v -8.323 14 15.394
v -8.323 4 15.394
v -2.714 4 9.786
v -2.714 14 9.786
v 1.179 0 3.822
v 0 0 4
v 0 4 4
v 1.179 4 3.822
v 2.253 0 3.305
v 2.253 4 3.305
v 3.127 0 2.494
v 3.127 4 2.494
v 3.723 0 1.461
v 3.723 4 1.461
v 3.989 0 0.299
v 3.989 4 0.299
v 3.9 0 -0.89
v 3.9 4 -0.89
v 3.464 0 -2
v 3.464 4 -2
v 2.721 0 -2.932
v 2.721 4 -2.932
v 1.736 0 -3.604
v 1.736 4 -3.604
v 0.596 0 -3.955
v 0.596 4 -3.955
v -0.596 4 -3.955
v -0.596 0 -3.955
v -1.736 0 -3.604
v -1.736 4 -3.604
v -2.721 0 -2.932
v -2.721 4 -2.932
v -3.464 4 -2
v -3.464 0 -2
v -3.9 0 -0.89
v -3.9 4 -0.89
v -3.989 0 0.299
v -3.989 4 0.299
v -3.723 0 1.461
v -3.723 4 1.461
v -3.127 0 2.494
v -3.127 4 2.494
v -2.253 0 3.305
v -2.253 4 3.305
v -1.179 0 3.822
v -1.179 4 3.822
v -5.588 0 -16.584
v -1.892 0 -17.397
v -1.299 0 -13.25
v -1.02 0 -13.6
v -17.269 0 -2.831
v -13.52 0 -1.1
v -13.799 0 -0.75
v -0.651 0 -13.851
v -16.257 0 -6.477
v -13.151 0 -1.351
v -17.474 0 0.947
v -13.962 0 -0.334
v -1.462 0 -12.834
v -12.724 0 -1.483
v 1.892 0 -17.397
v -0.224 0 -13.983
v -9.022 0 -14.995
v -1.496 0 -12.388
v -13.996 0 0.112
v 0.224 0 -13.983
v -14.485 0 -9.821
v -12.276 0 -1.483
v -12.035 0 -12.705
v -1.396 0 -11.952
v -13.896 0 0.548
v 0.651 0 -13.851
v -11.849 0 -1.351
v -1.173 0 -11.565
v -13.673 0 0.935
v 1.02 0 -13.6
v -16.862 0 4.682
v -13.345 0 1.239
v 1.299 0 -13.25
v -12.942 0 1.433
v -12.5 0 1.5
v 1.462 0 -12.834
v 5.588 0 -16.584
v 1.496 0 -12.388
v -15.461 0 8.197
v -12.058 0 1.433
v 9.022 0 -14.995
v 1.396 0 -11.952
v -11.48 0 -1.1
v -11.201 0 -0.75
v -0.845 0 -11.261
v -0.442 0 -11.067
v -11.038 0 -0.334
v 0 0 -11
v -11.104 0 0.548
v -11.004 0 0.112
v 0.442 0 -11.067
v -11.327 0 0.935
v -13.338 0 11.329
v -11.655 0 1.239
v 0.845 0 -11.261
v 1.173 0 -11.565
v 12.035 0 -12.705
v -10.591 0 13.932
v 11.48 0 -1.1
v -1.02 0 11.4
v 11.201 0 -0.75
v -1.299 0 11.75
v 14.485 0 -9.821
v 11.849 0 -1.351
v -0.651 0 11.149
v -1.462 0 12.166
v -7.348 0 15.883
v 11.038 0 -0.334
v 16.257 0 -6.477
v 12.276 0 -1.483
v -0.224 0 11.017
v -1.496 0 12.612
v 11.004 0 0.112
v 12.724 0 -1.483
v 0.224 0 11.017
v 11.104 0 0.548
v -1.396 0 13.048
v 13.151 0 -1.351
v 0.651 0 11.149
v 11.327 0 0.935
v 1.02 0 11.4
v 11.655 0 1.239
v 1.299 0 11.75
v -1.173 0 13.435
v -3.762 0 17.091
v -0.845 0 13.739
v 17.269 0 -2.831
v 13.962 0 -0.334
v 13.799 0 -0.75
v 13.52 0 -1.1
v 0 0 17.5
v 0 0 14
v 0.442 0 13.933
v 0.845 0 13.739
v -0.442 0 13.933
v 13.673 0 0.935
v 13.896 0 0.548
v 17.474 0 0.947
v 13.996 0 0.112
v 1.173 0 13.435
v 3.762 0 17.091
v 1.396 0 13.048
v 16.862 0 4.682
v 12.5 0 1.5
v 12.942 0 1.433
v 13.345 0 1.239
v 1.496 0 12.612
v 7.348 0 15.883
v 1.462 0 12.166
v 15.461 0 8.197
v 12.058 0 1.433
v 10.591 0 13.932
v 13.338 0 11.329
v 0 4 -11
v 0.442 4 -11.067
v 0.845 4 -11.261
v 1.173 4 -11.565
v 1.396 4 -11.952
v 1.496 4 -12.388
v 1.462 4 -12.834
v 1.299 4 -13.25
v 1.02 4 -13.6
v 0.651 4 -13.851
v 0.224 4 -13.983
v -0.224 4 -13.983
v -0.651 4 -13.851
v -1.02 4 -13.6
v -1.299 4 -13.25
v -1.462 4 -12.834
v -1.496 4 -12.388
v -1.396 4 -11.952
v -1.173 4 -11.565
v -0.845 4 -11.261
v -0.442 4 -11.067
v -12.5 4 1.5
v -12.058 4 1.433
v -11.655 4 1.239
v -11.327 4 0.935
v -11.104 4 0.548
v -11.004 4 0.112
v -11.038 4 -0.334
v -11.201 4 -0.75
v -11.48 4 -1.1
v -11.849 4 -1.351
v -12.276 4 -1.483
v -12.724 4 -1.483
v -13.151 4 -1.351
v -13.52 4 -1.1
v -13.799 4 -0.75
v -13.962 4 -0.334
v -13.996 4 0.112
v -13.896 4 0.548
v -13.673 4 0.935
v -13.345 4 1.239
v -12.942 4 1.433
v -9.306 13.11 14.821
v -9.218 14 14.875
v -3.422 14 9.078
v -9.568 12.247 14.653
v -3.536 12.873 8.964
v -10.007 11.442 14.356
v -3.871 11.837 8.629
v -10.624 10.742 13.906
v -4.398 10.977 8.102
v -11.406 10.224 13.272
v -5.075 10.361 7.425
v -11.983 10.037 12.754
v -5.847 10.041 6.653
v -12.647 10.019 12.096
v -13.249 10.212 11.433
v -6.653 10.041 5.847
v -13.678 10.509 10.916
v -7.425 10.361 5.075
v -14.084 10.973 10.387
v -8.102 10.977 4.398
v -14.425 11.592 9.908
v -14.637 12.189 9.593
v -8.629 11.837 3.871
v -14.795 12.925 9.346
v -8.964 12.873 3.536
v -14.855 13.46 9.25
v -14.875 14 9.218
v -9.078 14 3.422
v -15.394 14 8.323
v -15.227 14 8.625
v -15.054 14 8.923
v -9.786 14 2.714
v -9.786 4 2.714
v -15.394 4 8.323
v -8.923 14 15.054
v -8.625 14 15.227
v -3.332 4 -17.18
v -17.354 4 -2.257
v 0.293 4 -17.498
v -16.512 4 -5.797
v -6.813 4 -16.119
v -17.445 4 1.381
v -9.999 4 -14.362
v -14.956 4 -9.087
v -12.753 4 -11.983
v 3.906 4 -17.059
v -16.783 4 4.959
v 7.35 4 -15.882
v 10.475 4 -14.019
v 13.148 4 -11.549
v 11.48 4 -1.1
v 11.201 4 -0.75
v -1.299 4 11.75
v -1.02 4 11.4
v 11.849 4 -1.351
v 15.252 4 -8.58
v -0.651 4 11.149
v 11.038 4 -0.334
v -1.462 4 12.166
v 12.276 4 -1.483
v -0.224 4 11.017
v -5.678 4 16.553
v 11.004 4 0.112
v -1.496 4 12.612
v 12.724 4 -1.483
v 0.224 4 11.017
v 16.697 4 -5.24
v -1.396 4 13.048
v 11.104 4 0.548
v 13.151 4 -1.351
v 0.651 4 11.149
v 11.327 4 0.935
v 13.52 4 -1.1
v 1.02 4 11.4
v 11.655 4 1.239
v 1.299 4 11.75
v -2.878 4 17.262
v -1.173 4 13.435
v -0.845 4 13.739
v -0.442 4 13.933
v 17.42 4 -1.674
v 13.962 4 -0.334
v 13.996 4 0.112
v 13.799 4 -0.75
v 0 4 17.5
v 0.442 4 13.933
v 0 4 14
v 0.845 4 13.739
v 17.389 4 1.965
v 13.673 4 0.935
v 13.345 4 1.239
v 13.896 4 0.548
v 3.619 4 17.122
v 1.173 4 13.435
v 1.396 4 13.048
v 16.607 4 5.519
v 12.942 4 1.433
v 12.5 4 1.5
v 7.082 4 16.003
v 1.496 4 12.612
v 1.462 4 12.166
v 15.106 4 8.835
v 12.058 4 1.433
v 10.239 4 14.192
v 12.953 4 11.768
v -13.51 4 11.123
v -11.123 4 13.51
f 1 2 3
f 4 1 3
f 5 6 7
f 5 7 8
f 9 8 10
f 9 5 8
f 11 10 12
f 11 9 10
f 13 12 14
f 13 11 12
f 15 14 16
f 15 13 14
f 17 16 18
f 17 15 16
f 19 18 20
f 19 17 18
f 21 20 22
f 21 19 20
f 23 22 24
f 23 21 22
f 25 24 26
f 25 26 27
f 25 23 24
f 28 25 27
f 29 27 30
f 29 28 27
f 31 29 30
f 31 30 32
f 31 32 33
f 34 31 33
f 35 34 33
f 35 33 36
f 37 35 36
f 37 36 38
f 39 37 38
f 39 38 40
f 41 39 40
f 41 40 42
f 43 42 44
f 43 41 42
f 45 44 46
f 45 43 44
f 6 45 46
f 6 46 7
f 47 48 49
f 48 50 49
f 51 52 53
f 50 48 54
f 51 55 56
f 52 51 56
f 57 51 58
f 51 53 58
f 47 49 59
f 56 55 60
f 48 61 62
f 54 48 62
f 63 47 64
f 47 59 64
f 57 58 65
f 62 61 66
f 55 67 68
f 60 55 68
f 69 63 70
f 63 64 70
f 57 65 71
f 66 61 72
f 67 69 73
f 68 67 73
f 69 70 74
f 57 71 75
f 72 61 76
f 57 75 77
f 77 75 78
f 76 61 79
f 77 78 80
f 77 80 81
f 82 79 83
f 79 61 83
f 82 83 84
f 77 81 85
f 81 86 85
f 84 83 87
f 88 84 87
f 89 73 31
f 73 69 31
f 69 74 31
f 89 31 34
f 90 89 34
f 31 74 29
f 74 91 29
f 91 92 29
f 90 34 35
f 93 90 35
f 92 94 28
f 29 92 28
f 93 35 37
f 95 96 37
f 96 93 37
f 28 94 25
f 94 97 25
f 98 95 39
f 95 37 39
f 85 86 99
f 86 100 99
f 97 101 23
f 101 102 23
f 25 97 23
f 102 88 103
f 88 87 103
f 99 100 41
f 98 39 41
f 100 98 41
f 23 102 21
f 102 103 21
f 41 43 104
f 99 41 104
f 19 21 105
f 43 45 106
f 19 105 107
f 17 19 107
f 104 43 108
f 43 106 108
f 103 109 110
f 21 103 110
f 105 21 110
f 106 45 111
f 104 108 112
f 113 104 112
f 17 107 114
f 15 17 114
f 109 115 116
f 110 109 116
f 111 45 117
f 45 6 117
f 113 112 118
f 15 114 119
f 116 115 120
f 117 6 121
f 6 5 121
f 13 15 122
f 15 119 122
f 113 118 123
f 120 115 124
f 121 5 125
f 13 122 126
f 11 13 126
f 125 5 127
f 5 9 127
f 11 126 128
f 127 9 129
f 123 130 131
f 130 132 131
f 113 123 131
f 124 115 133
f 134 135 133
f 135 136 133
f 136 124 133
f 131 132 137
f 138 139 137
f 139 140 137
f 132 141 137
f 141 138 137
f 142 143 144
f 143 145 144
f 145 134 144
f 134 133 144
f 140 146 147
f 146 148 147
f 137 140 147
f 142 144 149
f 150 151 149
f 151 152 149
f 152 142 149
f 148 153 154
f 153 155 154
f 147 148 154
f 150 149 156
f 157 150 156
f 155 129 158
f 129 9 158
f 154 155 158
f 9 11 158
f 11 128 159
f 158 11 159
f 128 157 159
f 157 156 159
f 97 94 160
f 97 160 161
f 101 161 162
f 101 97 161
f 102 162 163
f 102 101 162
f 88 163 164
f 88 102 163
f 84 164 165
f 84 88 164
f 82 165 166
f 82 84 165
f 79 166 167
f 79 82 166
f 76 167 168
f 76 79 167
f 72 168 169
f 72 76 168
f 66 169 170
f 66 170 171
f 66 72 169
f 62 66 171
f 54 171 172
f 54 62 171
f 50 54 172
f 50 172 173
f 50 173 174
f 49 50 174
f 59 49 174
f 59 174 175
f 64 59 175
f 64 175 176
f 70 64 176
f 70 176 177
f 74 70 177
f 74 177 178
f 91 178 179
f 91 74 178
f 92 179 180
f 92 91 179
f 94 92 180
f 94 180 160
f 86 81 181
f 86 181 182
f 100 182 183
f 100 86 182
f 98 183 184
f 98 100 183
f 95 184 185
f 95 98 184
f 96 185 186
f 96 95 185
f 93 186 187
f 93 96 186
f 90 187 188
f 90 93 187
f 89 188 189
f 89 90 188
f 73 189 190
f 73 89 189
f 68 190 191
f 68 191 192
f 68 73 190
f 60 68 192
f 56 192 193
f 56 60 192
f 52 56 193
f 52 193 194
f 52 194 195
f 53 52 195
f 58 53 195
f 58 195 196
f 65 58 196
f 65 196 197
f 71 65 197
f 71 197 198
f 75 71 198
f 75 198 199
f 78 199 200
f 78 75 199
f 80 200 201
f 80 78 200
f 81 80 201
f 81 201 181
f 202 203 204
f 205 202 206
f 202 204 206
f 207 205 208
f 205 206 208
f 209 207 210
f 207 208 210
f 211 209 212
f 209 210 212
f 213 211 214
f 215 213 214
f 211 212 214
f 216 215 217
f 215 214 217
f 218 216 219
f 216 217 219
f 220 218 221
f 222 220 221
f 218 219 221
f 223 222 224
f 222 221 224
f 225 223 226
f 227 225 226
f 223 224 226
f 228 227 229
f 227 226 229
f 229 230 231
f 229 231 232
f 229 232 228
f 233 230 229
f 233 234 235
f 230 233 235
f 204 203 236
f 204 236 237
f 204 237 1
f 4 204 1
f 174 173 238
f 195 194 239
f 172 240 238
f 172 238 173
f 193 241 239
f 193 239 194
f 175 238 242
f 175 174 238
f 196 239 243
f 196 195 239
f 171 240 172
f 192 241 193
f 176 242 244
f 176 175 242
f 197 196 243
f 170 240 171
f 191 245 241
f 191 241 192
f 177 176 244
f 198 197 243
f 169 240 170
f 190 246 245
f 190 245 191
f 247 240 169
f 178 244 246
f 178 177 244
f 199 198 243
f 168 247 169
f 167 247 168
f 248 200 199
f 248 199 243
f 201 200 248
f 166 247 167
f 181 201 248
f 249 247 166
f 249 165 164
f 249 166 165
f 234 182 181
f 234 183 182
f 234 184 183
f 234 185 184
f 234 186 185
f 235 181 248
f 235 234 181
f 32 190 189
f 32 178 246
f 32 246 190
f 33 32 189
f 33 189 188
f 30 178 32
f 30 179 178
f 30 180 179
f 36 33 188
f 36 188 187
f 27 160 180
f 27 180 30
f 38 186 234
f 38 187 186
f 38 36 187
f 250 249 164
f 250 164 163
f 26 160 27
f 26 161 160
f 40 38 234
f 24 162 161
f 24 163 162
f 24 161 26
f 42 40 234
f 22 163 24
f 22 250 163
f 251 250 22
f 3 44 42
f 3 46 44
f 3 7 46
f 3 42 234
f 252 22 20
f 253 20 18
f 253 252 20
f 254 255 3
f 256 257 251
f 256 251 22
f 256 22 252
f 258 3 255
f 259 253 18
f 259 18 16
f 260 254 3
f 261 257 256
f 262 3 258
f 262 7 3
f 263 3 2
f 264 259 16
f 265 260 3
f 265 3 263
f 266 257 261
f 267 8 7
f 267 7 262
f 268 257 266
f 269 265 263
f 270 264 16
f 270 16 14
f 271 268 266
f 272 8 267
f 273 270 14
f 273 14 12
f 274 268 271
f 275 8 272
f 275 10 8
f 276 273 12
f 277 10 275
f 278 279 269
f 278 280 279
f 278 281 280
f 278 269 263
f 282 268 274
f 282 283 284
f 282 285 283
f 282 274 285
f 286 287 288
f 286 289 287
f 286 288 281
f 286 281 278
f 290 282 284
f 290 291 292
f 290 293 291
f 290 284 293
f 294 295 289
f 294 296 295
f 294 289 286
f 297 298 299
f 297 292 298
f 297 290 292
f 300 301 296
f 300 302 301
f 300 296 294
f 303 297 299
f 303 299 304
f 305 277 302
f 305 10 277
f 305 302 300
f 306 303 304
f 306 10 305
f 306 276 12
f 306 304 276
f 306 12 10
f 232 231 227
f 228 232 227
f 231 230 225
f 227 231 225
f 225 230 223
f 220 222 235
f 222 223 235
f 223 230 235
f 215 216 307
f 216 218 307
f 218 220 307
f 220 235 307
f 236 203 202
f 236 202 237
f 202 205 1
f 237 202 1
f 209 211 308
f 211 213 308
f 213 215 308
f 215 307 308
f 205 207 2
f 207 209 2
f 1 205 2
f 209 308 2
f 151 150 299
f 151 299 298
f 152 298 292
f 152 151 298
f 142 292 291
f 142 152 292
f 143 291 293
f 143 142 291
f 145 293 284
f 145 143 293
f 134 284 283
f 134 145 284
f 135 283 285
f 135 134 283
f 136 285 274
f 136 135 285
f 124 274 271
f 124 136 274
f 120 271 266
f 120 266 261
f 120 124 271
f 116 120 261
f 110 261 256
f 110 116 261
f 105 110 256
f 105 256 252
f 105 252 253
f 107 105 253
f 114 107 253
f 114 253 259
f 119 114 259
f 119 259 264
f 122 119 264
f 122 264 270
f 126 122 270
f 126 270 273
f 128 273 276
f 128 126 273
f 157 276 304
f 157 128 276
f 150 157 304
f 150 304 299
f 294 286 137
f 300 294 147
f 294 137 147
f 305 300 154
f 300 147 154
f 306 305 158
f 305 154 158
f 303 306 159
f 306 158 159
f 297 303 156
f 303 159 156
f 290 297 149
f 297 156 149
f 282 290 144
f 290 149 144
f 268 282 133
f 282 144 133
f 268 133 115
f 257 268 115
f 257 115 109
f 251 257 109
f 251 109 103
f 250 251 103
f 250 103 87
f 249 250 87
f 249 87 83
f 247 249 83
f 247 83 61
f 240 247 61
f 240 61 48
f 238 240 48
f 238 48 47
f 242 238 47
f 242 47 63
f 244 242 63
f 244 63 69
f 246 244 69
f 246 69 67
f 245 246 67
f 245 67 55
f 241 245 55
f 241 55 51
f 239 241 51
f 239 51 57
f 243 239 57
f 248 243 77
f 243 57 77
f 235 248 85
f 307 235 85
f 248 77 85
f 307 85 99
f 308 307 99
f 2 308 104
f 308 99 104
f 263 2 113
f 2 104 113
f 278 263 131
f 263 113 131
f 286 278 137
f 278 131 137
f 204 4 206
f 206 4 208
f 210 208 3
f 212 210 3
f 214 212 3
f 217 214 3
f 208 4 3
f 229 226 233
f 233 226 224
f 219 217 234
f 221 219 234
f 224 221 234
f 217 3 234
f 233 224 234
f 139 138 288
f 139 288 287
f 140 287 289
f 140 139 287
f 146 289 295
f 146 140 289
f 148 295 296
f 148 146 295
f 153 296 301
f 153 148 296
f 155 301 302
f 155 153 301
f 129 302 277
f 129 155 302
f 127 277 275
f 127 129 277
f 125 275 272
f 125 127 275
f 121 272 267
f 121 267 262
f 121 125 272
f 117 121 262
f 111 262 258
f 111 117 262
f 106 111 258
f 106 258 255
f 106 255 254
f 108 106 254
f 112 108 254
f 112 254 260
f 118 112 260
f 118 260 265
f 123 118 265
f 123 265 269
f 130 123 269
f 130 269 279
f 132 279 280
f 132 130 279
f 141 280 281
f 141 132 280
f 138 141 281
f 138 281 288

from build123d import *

# Parameters (mm, degrees)
SKETCH1_R           = 17.5
SKETCH1_R_2         = 4
SKETCH1_R_3         = 1.5
BOSS_EXTRUDE1_DEPTH = 4
BOSS_EXTRUDE2_DEPTH = 10
SKETCH3_R           = 4
CUT_EXTRUDE1_DEPTH  = 10


with BuildPart() as part:
    # Sketch1 → Boss-Extrude1 (new body)
    with BuildSketch(Plane(origin=(0, 0, 0), x_dir=(1, 0, 0), z_dir=(0, 1, 0))):
        with Locations(Location((0, 0, 0), (0, 0, 270))):
            Circle(SKETCH1_R)
        with Locations(Location((0, 0, 0), (0, 0, 270))):
            Circle(SKETCH1_R_2, mode=Mode.SUBTRACT)
        with Locations(Location((-12.5, 0, 0), (0, 0, 270))):
            Circle(SKETCH1_R_3, mode=Mode.SUBTRACT)
        with Locations(Location((0, 12.5, 0), (0, 0, 270))):
            Circle(SKETCH1_R_3, mode=Mode.SUBTRACT)
        with Locations(Location((12.5, 0, 0), (0, 0, 270))):
            Circle(SKETCH1_R_3, mode=Mode.SUBTRACT)
        with Locations(Location((0, -12.5, 0), (0, 0, 270))):
            Circle(SKETCH1_R_3, mode=Mode.SUBTRACT)
    extrude(amount=BOSS_EXTRUDE1_DEPTH)

    # Sketch2 → Boss-Extrude2 (add)
    with BuildSketch(Plane(origin=(0, 4, 0), x_dir=(1, 0, 0), z_dir=(0, 1, 0))):
        with BuildLine():
            Line((-6.25, -6.25), (-9.785533906, -2.714466094))
            Line((-9.785533906, -2.714466094), (-15.394075132, -8.32300732))
            ThreePointArc((-15.394075132, -8.32300732), (-12.374368671, -12.374368671), (-8.32300732, -15.394075132))
            Line((-8.32300732, -15.394075132), (-2.714466094, -9.785533906))
            Line((-2.714466094, -9.785533906), (-6.25, -6.25))
        make_face()
    extrude(amount=BOSS_EXTRUDE2_DEPTH)

    # Sketch3 → Cut-Extrude1 (cut)
    with BuildSketch(Plane(origin=(-6.25, 0, 6.25), x_dir=(-0.7071067811865475, 0, -0.7071067811865477), z_dir=(0.7071067811865477, 0, -0.7071067811865475))):
        with Locations((0, 14)):
            Circle(SKETCH3_R)
    extrude(amount=-CUT_EXTRUDE1_DEPTH, mode=Mode.SUBTRACT)


solid = part.part
